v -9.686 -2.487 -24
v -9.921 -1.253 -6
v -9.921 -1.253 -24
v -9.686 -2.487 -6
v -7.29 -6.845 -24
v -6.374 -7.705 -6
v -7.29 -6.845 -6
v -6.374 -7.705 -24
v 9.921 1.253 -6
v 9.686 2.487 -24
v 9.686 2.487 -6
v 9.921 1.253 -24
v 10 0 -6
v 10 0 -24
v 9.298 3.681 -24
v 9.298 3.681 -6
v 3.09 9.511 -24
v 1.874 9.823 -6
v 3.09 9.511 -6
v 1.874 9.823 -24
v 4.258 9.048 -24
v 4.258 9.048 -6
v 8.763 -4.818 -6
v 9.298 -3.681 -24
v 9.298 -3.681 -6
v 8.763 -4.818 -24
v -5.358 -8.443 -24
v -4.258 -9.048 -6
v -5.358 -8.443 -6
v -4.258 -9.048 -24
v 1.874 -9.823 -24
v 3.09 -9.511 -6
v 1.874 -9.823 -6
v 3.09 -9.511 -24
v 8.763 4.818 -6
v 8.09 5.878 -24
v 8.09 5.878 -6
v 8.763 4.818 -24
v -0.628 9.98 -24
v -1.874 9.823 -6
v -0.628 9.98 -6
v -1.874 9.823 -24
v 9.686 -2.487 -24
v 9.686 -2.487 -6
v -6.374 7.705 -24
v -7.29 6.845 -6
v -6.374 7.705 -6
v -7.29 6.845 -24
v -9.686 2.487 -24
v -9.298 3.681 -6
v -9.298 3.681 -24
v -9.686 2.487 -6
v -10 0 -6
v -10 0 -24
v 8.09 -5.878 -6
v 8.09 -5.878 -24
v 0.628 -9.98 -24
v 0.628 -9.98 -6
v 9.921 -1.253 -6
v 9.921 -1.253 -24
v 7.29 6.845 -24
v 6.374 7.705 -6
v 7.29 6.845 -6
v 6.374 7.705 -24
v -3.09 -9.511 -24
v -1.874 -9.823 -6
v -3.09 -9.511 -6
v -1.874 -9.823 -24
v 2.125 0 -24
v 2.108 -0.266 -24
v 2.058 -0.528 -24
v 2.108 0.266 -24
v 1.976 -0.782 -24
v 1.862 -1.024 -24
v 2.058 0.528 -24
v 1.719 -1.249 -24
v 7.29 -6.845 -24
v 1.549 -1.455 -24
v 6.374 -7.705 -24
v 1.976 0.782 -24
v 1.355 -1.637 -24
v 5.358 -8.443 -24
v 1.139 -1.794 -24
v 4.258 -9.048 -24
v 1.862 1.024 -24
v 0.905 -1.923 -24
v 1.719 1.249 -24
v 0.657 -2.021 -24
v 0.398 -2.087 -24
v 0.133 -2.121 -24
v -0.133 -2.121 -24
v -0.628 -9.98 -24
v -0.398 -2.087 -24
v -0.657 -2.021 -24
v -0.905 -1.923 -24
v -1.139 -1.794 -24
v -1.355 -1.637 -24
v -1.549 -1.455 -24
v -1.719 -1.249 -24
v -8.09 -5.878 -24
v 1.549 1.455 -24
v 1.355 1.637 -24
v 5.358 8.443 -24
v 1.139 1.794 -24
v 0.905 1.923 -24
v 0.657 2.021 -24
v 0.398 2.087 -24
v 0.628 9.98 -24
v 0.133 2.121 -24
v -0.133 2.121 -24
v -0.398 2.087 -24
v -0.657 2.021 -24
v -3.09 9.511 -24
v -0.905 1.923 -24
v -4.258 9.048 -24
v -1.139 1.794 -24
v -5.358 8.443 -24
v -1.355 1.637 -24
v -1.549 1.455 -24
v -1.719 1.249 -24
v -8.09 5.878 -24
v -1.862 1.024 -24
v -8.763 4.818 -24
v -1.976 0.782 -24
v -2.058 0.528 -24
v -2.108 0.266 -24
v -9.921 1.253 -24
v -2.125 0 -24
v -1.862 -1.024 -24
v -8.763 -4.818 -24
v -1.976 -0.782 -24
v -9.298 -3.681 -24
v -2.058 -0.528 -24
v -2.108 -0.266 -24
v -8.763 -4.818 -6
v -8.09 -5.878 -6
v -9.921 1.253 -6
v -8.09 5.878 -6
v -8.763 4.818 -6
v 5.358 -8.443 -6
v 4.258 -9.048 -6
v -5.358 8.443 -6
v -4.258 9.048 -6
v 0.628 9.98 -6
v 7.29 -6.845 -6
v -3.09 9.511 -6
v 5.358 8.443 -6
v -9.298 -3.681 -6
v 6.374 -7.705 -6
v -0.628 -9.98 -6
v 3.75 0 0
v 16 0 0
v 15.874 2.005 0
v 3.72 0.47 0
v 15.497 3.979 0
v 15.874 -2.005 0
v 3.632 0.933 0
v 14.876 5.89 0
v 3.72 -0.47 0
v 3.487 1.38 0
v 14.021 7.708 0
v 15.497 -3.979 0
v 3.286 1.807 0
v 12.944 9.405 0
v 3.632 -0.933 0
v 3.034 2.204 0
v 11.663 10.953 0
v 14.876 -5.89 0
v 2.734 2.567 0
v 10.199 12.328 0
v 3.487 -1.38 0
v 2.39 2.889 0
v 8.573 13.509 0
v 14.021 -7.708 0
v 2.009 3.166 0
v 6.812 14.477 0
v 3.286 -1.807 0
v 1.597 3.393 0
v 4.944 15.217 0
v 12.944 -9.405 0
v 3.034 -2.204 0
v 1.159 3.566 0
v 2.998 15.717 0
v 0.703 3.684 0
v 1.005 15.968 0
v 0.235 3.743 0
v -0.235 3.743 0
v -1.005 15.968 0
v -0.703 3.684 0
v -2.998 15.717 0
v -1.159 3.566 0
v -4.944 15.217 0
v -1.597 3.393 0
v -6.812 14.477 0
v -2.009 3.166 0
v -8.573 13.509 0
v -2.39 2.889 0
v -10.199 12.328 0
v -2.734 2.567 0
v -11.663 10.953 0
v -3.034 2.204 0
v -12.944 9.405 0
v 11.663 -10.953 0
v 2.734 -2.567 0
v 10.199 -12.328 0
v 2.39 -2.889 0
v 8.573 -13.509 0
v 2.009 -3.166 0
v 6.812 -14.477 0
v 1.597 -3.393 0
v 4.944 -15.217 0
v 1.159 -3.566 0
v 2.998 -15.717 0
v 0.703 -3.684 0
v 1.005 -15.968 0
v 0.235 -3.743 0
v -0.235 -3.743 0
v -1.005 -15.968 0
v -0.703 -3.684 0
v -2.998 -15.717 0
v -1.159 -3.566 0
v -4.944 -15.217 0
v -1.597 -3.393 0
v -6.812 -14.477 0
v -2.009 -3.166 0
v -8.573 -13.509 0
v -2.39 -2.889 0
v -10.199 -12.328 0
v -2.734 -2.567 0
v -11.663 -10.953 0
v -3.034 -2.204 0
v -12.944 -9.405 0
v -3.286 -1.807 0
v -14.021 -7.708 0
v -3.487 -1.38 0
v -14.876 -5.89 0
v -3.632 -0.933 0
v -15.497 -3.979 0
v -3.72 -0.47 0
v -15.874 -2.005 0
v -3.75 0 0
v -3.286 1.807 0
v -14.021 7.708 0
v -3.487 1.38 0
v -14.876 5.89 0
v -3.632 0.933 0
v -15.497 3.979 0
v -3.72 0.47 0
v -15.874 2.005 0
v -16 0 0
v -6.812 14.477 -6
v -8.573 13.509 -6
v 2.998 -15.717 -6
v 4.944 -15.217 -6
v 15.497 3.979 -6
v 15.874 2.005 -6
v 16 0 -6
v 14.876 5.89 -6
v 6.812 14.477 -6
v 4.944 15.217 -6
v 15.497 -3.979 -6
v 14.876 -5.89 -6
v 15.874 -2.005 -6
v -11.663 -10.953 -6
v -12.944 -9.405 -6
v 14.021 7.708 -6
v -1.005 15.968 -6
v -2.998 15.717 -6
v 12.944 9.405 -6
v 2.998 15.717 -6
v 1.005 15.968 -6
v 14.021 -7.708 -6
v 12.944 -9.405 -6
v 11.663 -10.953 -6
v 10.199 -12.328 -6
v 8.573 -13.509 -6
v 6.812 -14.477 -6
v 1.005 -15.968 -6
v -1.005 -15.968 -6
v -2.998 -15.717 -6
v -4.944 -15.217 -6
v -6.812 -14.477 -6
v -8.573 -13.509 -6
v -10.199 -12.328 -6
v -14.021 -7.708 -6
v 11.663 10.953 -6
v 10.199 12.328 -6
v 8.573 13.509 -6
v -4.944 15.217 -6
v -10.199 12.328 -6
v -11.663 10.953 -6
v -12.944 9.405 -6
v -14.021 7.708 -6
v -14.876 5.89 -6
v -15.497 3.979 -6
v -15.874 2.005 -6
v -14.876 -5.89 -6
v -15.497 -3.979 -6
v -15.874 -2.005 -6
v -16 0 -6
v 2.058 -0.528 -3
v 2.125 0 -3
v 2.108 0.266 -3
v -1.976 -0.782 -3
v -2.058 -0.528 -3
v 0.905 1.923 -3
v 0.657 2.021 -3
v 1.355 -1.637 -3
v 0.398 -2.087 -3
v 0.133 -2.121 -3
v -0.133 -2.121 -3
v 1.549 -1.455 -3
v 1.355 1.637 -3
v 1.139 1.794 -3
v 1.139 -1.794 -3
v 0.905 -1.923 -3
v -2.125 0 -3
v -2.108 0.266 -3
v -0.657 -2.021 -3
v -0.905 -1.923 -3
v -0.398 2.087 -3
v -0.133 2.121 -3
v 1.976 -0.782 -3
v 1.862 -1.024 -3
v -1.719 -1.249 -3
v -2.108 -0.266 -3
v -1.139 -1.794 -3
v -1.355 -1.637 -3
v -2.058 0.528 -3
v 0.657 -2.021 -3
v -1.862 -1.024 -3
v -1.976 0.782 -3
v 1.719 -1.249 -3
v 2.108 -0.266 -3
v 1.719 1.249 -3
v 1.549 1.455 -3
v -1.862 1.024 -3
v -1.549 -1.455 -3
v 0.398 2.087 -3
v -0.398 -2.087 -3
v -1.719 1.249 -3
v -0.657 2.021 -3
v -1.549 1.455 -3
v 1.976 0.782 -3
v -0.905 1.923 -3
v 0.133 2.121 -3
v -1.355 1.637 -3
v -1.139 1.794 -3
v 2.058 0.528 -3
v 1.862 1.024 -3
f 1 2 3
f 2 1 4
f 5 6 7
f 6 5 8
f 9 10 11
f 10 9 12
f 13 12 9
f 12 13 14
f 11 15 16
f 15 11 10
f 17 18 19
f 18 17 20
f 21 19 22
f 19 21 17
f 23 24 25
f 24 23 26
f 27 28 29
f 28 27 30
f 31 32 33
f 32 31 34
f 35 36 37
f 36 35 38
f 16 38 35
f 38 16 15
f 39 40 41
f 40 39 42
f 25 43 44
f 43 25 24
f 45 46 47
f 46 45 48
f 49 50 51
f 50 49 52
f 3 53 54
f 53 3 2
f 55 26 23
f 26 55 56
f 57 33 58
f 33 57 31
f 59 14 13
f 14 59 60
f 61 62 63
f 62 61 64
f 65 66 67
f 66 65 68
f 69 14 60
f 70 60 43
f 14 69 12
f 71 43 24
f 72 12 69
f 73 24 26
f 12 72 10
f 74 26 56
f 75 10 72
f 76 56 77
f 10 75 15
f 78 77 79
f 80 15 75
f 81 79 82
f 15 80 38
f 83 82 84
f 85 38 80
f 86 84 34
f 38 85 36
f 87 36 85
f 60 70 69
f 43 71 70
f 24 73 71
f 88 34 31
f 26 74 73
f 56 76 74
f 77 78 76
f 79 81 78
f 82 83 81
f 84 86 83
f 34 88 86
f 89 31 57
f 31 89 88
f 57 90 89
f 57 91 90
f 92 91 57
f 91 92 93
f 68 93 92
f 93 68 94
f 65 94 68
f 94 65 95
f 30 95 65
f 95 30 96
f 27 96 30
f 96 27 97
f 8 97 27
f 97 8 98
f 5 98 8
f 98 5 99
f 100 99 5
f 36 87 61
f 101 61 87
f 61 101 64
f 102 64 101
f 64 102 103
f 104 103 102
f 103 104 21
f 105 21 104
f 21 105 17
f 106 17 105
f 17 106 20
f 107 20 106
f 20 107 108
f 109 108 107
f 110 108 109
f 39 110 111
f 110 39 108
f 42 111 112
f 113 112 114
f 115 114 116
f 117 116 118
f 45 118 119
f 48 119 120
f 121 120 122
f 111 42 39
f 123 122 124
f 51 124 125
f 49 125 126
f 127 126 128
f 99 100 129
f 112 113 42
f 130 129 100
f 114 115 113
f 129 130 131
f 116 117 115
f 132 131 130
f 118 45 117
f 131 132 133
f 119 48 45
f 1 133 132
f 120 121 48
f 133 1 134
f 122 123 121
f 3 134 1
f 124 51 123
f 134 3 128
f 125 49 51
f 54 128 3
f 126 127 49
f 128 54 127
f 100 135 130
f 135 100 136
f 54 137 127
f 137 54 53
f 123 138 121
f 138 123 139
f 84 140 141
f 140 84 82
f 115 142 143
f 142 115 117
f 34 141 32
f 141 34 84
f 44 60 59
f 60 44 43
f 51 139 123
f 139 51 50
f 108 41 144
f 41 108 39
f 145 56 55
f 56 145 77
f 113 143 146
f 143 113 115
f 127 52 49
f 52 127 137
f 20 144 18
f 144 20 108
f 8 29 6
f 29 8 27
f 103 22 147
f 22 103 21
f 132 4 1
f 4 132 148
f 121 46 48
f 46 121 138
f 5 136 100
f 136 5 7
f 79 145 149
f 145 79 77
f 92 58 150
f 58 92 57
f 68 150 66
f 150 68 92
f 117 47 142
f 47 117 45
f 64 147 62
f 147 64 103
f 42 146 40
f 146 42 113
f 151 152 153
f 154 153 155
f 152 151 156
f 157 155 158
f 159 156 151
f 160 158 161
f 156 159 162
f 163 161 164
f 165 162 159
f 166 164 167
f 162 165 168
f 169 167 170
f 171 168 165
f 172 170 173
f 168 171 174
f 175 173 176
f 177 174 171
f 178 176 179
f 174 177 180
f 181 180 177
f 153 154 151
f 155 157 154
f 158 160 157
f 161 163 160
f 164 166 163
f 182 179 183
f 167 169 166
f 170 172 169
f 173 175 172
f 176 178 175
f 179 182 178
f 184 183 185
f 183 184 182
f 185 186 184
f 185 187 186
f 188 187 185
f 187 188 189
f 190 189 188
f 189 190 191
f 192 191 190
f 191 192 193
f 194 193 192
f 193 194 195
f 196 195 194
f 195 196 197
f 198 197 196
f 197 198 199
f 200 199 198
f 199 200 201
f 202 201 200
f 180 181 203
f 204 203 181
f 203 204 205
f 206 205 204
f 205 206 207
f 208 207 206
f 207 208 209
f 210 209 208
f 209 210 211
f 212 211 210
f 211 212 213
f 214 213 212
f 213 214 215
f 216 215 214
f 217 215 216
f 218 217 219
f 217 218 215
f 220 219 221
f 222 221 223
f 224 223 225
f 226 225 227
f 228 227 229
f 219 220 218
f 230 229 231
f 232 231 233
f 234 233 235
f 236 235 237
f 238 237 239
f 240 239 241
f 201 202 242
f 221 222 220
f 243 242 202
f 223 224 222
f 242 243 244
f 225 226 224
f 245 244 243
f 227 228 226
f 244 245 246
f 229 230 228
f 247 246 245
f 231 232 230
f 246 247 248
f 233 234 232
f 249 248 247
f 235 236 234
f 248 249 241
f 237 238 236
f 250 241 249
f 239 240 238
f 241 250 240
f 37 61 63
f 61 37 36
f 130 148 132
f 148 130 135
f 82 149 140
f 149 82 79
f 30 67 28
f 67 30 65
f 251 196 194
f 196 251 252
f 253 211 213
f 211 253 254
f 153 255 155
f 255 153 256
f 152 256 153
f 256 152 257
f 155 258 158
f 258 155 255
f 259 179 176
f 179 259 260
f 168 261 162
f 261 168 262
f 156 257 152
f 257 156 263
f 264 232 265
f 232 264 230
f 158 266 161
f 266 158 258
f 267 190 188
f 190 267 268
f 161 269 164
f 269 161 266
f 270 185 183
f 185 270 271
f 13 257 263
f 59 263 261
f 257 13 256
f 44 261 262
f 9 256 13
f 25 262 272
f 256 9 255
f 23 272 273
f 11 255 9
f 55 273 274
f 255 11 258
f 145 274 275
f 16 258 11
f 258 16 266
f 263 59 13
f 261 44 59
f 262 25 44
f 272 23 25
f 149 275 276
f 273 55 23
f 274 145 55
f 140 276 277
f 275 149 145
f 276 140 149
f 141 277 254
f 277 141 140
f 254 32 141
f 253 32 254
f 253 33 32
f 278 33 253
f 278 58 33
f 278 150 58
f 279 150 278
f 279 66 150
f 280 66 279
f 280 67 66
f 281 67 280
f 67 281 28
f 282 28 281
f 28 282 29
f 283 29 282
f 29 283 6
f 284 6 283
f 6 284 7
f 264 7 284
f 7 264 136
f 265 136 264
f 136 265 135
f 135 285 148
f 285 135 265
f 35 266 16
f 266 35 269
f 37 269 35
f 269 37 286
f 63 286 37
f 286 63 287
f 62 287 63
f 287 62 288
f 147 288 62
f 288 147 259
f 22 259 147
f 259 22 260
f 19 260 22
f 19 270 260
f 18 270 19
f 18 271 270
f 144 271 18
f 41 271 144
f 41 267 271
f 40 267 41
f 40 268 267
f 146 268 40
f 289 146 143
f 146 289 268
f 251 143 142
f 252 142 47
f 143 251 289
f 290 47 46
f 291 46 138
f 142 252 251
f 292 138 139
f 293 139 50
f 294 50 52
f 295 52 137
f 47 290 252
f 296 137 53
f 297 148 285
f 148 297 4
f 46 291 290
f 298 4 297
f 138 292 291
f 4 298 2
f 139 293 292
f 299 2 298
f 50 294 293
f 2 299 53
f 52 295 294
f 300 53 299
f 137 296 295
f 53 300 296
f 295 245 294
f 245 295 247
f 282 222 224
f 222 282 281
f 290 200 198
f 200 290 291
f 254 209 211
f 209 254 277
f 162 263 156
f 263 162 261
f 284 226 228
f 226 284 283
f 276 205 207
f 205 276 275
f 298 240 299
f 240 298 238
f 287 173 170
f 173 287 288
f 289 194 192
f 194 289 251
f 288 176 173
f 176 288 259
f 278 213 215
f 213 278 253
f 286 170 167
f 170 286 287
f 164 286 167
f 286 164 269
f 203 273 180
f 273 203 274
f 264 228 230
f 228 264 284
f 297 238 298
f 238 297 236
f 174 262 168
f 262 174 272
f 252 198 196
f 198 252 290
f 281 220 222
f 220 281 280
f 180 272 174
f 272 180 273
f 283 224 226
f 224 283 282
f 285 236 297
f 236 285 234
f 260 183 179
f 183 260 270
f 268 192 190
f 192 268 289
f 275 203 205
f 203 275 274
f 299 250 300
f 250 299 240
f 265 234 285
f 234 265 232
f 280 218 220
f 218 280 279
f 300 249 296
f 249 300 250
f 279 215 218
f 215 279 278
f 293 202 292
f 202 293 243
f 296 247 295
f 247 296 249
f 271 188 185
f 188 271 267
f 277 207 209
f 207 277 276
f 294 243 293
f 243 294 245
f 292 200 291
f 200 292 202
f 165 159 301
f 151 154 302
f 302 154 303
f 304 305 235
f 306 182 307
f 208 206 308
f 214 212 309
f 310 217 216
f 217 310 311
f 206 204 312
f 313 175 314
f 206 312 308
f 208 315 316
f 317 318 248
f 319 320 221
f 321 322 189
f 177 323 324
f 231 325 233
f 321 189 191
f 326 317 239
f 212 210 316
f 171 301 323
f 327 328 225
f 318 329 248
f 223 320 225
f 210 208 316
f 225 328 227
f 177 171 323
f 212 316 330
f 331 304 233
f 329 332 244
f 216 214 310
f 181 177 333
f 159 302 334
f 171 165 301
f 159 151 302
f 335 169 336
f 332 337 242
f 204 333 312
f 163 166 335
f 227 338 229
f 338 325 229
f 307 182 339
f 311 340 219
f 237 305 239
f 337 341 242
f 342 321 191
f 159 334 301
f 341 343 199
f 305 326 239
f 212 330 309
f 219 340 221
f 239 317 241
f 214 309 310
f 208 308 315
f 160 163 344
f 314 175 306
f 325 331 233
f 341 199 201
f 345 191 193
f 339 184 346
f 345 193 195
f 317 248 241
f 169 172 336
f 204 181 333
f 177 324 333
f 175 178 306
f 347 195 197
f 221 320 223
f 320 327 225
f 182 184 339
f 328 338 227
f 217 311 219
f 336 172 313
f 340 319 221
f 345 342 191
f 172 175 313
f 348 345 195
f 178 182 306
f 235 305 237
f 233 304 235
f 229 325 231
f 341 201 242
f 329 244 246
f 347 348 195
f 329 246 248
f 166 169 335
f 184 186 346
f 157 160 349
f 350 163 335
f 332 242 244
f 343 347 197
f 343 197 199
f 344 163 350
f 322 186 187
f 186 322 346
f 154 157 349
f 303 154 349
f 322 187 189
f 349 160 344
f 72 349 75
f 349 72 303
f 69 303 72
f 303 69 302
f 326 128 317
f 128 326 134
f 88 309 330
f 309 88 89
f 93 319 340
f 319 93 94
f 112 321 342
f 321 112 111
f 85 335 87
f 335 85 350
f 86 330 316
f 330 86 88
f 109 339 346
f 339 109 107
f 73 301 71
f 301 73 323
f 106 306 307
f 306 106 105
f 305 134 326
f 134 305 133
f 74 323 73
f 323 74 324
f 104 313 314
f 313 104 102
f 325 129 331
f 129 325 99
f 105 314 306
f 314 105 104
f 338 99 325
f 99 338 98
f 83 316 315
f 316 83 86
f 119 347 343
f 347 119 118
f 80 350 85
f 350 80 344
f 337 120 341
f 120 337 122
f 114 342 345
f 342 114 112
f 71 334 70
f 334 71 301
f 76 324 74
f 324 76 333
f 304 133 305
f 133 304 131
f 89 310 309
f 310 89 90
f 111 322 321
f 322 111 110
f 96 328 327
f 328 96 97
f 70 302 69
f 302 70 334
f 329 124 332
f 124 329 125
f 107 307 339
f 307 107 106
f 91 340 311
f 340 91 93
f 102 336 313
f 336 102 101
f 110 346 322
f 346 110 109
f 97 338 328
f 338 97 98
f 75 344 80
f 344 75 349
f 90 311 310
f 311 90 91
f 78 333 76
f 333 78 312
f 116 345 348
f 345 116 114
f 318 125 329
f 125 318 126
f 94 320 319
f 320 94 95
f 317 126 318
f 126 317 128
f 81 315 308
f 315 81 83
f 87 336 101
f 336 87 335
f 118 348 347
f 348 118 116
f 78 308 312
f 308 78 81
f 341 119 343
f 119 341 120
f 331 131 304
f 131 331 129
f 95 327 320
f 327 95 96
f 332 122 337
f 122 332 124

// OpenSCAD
$fn = 50;


difference() {
	union() {
		translate(v = [0, 0, -24.0000000000]) {
			cylinder(h = 24, r = 10.0000000000);
		}
		translate(v = [0, 0, -6.0000000000]) {
			cylinder(h = 6, r = 16.0000000000);
		}
	}
	union() {
		translate(v = [0, 0, 0]) {
			rotate(a = [0, 0, 0]) {
				difference() {
					union() {
						#translate(v = [0, 0, -24.0000000000]) {
							cylinder(h = 24, r = 2.0000000000);
						}
						#translate(v = [0, 0, -3]) {
							cylinder(h = 3, r1 = 2.1250000000, r2 = 3.7500000000);
						}
						#translate(v = [0, 0, -24.0000000000]) {
							cylinder(h = 24, r = 2.1250000000);
						}
						#translate(v = [0, 0, -24.0000000000]) {
							cylinder(h = 24, r = 2.0000000000);
						}
					}
					union();
				}
			}
		}
	}
}
